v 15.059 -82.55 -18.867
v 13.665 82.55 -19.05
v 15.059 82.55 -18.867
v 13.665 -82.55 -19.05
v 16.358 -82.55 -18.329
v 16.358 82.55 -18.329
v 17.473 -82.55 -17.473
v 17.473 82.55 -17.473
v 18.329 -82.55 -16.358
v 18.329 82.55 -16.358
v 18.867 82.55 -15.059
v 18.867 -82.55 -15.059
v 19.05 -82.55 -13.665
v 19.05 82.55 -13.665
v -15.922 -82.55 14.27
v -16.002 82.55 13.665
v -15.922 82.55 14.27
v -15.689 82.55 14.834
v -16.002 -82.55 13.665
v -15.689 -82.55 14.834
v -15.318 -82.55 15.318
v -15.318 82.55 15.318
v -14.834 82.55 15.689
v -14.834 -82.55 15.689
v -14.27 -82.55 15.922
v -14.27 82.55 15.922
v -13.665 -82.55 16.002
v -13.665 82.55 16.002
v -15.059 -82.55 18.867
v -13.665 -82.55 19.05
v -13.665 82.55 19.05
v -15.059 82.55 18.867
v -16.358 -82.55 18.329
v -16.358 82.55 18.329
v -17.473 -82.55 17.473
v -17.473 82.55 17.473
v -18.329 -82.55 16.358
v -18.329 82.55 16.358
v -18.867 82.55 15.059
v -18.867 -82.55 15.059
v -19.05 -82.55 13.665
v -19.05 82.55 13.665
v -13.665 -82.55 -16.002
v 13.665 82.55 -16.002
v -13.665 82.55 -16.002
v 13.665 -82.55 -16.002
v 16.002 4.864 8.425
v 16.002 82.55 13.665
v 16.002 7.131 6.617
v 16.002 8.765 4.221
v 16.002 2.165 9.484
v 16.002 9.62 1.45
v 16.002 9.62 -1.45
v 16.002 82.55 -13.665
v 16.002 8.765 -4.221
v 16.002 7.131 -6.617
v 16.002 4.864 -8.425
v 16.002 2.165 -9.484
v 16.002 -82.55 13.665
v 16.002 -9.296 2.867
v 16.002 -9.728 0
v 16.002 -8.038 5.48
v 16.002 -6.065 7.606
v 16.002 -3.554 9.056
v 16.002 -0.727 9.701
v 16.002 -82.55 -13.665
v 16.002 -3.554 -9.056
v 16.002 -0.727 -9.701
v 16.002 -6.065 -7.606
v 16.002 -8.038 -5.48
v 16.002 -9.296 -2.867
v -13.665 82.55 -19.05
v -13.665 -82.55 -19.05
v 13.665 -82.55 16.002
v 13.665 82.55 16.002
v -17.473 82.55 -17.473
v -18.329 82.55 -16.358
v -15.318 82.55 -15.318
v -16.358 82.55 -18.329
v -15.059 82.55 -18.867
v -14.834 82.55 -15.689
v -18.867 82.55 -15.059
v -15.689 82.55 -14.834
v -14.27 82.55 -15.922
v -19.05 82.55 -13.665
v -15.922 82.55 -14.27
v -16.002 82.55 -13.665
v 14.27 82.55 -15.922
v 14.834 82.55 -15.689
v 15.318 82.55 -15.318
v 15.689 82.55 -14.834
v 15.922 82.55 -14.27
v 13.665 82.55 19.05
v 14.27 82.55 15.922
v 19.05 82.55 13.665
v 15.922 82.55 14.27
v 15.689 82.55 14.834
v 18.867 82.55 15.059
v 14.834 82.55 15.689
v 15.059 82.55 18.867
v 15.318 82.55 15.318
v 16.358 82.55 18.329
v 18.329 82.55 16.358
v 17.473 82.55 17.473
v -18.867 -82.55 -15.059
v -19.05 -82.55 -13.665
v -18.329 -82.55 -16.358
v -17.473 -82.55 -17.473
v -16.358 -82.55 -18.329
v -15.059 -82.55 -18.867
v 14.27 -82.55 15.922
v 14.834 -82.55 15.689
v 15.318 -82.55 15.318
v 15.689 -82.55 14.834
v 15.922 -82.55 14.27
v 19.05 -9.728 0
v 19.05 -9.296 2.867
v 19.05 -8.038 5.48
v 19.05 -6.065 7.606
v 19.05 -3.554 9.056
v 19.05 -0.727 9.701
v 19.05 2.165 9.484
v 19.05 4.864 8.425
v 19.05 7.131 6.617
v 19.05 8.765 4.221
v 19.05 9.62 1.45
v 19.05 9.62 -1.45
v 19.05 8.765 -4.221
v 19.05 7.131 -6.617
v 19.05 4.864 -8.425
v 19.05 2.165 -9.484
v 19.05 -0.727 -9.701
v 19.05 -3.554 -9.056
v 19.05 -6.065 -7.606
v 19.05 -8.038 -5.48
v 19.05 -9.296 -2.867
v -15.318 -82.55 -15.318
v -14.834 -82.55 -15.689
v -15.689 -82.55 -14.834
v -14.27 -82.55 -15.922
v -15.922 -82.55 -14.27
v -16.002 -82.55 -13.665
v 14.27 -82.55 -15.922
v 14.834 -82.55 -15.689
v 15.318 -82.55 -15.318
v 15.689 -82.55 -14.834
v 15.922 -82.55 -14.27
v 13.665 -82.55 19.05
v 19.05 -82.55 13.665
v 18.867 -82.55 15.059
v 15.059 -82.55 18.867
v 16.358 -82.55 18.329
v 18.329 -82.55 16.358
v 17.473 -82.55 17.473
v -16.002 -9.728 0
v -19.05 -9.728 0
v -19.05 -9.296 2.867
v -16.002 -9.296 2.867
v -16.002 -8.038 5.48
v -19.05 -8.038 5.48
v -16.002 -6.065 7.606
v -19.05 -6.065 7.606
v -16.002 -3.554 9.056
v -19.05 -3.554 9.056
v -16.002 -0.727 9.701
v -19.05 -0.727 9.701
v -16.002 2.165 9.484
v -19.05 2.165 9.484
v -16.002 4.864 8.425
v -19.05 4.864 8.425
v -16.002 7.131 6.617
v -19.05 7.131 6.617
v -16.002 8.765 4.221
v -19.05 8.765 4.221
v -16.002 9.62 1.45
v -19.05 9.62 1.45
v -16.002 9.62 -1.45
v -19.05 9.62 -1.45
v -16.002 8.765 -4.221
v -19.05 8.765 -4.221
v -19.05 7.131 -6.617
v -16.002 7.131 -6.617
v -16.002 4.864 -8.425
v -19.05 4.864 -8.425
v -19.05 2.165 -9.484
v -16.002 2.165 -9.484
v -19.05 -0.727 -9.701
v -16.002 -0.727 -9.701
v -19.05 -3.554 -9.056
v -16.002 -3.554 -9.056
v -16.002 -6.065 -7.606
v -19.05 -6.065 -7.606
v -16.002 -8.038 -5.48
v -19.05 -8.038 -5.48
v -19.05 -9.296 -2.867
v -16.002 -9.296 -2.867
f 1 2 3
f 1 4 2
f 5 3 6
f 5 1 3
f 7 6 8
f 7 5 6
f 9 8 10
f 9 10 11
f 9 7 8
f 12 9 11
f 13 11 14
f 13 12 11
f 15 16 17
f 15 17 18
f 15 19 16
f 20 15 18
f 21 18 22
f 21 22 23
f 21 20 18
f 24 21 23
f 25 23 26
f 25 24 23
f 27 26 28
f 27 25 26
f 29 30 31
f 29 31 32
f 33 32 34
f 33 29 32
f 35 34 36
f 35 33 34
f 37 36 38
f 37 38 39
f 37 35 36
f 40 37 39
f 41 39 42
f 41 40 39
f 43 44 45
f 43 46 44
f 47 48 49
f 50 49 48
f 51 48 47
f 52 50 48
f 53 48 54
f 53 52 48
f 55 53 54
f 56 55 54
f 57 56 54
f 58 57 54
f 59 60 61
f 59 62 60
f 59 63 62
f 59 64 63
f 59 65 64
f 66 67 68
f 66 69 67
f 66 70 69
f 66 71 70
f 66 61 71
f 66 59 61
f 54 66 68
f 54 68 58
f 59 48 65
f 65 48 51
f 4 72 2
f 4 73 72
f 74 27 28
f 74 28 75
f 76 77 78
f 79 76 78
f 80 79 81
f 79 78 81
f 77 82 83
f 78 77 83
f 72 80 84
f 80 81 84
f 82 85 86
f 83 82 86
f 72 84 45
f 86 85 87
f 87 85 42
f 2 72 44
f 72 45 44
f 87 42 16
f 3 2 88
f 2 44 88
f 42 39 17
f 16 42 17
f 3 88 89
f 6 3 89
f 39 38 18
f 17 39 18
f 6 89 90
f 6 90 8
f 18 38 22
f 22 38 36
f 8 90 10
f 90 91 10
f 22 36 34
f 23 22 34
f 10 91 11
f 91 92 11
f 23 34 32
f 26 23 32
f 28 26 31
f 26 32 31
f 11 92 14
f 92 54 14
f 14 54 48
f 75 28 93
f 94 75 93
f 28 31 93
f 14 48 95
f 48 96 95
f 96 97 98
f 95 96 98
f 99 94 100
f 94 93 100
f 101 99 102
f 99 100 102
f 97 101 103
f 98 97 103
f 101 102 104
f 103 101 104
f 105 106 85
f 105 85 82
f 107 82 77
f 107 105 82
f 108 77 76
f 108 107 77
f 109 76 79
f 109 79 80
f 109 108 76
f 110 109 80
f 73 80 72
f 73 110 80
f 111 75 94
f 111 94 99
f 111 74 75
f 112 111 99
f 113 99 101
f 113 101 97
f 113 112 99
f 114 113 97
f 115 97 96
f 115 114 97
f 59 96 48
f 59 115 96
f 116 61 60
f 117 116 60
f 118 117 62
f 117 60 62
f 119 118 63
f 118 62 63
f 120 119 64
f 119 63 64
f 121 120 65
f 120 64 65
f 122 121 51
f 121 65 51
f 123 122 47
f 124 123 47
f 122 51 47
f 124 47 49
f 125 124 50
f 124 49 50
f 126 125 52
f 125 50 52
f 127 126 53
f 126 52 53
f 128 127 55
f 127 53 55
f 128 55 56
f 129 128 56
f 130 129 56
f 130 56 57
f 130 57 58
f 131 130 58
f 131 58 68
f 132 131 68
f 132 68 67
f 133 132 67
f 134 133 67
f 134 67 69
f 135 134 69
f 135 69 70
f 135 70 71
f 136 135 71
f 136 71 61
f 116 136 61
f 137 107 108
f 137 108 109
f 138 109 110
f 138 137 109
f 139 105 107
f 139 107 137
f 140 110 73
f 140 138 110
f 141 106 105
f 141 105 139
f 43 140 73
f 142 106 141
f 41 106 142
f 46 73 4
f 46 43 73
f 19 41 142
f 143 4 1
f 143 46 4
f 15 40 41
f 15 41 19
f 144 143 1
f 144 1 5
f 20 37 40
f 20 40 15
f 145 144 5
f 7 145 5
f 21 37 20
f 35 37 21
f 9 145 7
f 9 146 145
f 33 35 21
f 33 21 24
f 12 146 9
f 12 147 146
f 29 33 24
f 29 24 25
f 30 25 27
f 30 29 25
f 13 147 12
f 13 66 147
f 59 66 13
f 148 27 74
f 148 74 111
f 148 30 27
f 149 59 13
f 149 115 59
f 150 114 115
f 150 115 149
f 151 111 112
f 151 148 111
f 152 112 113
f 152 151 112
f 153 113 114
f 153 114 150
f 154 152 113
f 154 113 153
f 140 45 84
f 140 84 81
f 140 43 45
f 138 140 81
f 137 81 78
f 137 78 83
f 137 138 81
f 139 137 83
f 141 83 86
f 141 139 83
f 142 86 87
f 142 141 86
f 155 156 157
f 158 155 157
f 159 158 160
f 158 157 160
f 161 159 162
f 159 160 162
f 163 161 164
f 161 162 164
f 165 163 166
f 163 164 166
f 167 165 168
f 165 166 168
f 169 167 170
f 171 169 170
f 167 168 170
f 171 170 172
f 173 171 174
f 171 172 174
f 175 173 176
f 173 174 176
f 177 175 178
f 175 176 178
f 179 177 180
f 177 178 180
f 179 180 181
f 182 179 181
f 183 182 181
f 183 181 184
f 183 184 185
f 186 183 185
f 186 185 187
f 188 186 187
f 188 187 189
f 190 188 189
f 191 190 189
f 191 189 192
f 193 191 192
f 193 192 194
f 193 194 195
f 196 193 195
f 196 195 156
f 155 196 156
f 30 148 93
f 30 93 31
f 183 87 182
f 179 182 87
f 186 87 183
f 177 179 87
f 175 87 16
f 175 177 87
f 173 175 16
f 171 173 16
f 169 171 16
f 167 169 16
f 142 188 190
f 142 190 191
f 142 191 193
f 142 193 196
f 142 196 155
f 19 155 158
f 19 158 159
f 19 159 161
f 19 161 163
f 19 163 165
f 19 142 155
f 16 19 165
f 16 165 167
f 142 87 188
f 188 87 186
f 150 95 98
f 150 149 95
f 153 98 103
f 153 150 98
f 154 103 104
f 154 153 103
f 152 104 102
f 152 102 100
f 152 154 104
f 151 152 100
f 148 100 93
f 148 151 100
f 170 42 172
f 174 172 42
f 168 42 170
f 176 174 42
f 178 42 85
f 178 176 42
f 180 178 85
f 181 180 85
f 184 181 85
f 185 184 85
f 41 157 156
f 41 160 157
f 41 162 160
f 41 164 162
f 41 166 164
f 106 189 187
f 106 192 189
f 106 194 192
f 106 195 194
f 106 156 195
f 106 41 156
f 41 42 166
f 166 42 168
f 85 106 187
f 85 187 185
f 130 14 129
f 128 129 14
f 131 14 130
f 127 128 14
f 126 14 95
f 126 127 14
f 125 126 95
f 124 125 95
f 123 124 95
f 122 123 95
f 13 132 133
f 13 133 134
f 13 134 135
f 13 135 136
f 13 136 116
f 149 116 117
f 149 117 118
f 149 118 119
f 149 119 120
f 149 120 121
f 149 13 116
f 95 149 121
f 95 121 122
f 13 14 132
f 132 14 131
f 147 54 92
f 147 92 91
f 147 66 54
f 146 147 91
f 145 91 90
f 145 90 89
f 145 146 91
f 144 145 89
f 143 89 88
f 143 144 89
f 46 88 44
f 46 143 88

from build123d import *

# Parameters (mm, degrees)
F1_DEPTH = 82.55
F2_R     = 9.7282
F3_DEPTH = 38.101


with BuildPart() as f1:
    # F0 (on Front) → F1 (new body, symmetric)
    with BuildSketch(Plane.XZ):
        with BuildLine():
            ThreePointArc((19.05, 13.6652), (17.472829, 17.472829), (13.6652, 19.05))
            Line((13.6652, 19.05), (-13.6652, 19.05))
            ThreePointArc((-13.6652, 19.05), (-17.472829, 17.472829), (-19.05, 13.6652))
            Line((-19.05, 13.6652), (-19.05, -13.6652))
            ThreePointArc((-19.05, -13.6652), (-17.472829, -17.472829), (-13.6652, -19.05))
            Line((-13.6652, -19.05), (13.6652, -19.05))
            ThreePointArc((13.6652, -19.05), (17.472829, -17.472829), (19.05, -13.6652))
            Line((19.05, -13.6652), (19.05, 13.6652))
        make_face()
        with BuildLine():
            Line((-13.6652, 16.002), (13.6652, 16.002))
            ThreePointArc((13.6652, 16.002), (15.317567, 15.317567), (16.002, 13.6652))
            Line((16.002, 13.6652), (16.002, -13.6652))
            ThreePointArc((16.002, -13.6652), (15.317567, -15.317567), (13.6652, -16.002))
            Line((13.6652, -16.002), (-13.6652, -16.002))
            ThreePointArc((-13.6652, -16.002), (-15.317567, -15.317567), (-16.002, -13.6652))
            Line((-16.002, -13.6652), (-16.002, 13.6652))
            ThreePointArc((-16.002, 13.6652), (-15.317567, 15.317567), (-13.6652, 16.002))
        make_face(mode=Mode.SUBTRACT)
    extrude(amount=F1_DEPTH, both=True)

    # F2 (on face) → F3 (cut, through all)
    with BuildSketch(Plane(origin=(-19.05, 0, 0), x_dir=(0, -1, 0), z_dir=(-1, 0, 0))):
        Circle(F2_R)
    extrude(amount=-F3_DEPTH, mode=Mode.SUBTRACT)


solid = f1.part
